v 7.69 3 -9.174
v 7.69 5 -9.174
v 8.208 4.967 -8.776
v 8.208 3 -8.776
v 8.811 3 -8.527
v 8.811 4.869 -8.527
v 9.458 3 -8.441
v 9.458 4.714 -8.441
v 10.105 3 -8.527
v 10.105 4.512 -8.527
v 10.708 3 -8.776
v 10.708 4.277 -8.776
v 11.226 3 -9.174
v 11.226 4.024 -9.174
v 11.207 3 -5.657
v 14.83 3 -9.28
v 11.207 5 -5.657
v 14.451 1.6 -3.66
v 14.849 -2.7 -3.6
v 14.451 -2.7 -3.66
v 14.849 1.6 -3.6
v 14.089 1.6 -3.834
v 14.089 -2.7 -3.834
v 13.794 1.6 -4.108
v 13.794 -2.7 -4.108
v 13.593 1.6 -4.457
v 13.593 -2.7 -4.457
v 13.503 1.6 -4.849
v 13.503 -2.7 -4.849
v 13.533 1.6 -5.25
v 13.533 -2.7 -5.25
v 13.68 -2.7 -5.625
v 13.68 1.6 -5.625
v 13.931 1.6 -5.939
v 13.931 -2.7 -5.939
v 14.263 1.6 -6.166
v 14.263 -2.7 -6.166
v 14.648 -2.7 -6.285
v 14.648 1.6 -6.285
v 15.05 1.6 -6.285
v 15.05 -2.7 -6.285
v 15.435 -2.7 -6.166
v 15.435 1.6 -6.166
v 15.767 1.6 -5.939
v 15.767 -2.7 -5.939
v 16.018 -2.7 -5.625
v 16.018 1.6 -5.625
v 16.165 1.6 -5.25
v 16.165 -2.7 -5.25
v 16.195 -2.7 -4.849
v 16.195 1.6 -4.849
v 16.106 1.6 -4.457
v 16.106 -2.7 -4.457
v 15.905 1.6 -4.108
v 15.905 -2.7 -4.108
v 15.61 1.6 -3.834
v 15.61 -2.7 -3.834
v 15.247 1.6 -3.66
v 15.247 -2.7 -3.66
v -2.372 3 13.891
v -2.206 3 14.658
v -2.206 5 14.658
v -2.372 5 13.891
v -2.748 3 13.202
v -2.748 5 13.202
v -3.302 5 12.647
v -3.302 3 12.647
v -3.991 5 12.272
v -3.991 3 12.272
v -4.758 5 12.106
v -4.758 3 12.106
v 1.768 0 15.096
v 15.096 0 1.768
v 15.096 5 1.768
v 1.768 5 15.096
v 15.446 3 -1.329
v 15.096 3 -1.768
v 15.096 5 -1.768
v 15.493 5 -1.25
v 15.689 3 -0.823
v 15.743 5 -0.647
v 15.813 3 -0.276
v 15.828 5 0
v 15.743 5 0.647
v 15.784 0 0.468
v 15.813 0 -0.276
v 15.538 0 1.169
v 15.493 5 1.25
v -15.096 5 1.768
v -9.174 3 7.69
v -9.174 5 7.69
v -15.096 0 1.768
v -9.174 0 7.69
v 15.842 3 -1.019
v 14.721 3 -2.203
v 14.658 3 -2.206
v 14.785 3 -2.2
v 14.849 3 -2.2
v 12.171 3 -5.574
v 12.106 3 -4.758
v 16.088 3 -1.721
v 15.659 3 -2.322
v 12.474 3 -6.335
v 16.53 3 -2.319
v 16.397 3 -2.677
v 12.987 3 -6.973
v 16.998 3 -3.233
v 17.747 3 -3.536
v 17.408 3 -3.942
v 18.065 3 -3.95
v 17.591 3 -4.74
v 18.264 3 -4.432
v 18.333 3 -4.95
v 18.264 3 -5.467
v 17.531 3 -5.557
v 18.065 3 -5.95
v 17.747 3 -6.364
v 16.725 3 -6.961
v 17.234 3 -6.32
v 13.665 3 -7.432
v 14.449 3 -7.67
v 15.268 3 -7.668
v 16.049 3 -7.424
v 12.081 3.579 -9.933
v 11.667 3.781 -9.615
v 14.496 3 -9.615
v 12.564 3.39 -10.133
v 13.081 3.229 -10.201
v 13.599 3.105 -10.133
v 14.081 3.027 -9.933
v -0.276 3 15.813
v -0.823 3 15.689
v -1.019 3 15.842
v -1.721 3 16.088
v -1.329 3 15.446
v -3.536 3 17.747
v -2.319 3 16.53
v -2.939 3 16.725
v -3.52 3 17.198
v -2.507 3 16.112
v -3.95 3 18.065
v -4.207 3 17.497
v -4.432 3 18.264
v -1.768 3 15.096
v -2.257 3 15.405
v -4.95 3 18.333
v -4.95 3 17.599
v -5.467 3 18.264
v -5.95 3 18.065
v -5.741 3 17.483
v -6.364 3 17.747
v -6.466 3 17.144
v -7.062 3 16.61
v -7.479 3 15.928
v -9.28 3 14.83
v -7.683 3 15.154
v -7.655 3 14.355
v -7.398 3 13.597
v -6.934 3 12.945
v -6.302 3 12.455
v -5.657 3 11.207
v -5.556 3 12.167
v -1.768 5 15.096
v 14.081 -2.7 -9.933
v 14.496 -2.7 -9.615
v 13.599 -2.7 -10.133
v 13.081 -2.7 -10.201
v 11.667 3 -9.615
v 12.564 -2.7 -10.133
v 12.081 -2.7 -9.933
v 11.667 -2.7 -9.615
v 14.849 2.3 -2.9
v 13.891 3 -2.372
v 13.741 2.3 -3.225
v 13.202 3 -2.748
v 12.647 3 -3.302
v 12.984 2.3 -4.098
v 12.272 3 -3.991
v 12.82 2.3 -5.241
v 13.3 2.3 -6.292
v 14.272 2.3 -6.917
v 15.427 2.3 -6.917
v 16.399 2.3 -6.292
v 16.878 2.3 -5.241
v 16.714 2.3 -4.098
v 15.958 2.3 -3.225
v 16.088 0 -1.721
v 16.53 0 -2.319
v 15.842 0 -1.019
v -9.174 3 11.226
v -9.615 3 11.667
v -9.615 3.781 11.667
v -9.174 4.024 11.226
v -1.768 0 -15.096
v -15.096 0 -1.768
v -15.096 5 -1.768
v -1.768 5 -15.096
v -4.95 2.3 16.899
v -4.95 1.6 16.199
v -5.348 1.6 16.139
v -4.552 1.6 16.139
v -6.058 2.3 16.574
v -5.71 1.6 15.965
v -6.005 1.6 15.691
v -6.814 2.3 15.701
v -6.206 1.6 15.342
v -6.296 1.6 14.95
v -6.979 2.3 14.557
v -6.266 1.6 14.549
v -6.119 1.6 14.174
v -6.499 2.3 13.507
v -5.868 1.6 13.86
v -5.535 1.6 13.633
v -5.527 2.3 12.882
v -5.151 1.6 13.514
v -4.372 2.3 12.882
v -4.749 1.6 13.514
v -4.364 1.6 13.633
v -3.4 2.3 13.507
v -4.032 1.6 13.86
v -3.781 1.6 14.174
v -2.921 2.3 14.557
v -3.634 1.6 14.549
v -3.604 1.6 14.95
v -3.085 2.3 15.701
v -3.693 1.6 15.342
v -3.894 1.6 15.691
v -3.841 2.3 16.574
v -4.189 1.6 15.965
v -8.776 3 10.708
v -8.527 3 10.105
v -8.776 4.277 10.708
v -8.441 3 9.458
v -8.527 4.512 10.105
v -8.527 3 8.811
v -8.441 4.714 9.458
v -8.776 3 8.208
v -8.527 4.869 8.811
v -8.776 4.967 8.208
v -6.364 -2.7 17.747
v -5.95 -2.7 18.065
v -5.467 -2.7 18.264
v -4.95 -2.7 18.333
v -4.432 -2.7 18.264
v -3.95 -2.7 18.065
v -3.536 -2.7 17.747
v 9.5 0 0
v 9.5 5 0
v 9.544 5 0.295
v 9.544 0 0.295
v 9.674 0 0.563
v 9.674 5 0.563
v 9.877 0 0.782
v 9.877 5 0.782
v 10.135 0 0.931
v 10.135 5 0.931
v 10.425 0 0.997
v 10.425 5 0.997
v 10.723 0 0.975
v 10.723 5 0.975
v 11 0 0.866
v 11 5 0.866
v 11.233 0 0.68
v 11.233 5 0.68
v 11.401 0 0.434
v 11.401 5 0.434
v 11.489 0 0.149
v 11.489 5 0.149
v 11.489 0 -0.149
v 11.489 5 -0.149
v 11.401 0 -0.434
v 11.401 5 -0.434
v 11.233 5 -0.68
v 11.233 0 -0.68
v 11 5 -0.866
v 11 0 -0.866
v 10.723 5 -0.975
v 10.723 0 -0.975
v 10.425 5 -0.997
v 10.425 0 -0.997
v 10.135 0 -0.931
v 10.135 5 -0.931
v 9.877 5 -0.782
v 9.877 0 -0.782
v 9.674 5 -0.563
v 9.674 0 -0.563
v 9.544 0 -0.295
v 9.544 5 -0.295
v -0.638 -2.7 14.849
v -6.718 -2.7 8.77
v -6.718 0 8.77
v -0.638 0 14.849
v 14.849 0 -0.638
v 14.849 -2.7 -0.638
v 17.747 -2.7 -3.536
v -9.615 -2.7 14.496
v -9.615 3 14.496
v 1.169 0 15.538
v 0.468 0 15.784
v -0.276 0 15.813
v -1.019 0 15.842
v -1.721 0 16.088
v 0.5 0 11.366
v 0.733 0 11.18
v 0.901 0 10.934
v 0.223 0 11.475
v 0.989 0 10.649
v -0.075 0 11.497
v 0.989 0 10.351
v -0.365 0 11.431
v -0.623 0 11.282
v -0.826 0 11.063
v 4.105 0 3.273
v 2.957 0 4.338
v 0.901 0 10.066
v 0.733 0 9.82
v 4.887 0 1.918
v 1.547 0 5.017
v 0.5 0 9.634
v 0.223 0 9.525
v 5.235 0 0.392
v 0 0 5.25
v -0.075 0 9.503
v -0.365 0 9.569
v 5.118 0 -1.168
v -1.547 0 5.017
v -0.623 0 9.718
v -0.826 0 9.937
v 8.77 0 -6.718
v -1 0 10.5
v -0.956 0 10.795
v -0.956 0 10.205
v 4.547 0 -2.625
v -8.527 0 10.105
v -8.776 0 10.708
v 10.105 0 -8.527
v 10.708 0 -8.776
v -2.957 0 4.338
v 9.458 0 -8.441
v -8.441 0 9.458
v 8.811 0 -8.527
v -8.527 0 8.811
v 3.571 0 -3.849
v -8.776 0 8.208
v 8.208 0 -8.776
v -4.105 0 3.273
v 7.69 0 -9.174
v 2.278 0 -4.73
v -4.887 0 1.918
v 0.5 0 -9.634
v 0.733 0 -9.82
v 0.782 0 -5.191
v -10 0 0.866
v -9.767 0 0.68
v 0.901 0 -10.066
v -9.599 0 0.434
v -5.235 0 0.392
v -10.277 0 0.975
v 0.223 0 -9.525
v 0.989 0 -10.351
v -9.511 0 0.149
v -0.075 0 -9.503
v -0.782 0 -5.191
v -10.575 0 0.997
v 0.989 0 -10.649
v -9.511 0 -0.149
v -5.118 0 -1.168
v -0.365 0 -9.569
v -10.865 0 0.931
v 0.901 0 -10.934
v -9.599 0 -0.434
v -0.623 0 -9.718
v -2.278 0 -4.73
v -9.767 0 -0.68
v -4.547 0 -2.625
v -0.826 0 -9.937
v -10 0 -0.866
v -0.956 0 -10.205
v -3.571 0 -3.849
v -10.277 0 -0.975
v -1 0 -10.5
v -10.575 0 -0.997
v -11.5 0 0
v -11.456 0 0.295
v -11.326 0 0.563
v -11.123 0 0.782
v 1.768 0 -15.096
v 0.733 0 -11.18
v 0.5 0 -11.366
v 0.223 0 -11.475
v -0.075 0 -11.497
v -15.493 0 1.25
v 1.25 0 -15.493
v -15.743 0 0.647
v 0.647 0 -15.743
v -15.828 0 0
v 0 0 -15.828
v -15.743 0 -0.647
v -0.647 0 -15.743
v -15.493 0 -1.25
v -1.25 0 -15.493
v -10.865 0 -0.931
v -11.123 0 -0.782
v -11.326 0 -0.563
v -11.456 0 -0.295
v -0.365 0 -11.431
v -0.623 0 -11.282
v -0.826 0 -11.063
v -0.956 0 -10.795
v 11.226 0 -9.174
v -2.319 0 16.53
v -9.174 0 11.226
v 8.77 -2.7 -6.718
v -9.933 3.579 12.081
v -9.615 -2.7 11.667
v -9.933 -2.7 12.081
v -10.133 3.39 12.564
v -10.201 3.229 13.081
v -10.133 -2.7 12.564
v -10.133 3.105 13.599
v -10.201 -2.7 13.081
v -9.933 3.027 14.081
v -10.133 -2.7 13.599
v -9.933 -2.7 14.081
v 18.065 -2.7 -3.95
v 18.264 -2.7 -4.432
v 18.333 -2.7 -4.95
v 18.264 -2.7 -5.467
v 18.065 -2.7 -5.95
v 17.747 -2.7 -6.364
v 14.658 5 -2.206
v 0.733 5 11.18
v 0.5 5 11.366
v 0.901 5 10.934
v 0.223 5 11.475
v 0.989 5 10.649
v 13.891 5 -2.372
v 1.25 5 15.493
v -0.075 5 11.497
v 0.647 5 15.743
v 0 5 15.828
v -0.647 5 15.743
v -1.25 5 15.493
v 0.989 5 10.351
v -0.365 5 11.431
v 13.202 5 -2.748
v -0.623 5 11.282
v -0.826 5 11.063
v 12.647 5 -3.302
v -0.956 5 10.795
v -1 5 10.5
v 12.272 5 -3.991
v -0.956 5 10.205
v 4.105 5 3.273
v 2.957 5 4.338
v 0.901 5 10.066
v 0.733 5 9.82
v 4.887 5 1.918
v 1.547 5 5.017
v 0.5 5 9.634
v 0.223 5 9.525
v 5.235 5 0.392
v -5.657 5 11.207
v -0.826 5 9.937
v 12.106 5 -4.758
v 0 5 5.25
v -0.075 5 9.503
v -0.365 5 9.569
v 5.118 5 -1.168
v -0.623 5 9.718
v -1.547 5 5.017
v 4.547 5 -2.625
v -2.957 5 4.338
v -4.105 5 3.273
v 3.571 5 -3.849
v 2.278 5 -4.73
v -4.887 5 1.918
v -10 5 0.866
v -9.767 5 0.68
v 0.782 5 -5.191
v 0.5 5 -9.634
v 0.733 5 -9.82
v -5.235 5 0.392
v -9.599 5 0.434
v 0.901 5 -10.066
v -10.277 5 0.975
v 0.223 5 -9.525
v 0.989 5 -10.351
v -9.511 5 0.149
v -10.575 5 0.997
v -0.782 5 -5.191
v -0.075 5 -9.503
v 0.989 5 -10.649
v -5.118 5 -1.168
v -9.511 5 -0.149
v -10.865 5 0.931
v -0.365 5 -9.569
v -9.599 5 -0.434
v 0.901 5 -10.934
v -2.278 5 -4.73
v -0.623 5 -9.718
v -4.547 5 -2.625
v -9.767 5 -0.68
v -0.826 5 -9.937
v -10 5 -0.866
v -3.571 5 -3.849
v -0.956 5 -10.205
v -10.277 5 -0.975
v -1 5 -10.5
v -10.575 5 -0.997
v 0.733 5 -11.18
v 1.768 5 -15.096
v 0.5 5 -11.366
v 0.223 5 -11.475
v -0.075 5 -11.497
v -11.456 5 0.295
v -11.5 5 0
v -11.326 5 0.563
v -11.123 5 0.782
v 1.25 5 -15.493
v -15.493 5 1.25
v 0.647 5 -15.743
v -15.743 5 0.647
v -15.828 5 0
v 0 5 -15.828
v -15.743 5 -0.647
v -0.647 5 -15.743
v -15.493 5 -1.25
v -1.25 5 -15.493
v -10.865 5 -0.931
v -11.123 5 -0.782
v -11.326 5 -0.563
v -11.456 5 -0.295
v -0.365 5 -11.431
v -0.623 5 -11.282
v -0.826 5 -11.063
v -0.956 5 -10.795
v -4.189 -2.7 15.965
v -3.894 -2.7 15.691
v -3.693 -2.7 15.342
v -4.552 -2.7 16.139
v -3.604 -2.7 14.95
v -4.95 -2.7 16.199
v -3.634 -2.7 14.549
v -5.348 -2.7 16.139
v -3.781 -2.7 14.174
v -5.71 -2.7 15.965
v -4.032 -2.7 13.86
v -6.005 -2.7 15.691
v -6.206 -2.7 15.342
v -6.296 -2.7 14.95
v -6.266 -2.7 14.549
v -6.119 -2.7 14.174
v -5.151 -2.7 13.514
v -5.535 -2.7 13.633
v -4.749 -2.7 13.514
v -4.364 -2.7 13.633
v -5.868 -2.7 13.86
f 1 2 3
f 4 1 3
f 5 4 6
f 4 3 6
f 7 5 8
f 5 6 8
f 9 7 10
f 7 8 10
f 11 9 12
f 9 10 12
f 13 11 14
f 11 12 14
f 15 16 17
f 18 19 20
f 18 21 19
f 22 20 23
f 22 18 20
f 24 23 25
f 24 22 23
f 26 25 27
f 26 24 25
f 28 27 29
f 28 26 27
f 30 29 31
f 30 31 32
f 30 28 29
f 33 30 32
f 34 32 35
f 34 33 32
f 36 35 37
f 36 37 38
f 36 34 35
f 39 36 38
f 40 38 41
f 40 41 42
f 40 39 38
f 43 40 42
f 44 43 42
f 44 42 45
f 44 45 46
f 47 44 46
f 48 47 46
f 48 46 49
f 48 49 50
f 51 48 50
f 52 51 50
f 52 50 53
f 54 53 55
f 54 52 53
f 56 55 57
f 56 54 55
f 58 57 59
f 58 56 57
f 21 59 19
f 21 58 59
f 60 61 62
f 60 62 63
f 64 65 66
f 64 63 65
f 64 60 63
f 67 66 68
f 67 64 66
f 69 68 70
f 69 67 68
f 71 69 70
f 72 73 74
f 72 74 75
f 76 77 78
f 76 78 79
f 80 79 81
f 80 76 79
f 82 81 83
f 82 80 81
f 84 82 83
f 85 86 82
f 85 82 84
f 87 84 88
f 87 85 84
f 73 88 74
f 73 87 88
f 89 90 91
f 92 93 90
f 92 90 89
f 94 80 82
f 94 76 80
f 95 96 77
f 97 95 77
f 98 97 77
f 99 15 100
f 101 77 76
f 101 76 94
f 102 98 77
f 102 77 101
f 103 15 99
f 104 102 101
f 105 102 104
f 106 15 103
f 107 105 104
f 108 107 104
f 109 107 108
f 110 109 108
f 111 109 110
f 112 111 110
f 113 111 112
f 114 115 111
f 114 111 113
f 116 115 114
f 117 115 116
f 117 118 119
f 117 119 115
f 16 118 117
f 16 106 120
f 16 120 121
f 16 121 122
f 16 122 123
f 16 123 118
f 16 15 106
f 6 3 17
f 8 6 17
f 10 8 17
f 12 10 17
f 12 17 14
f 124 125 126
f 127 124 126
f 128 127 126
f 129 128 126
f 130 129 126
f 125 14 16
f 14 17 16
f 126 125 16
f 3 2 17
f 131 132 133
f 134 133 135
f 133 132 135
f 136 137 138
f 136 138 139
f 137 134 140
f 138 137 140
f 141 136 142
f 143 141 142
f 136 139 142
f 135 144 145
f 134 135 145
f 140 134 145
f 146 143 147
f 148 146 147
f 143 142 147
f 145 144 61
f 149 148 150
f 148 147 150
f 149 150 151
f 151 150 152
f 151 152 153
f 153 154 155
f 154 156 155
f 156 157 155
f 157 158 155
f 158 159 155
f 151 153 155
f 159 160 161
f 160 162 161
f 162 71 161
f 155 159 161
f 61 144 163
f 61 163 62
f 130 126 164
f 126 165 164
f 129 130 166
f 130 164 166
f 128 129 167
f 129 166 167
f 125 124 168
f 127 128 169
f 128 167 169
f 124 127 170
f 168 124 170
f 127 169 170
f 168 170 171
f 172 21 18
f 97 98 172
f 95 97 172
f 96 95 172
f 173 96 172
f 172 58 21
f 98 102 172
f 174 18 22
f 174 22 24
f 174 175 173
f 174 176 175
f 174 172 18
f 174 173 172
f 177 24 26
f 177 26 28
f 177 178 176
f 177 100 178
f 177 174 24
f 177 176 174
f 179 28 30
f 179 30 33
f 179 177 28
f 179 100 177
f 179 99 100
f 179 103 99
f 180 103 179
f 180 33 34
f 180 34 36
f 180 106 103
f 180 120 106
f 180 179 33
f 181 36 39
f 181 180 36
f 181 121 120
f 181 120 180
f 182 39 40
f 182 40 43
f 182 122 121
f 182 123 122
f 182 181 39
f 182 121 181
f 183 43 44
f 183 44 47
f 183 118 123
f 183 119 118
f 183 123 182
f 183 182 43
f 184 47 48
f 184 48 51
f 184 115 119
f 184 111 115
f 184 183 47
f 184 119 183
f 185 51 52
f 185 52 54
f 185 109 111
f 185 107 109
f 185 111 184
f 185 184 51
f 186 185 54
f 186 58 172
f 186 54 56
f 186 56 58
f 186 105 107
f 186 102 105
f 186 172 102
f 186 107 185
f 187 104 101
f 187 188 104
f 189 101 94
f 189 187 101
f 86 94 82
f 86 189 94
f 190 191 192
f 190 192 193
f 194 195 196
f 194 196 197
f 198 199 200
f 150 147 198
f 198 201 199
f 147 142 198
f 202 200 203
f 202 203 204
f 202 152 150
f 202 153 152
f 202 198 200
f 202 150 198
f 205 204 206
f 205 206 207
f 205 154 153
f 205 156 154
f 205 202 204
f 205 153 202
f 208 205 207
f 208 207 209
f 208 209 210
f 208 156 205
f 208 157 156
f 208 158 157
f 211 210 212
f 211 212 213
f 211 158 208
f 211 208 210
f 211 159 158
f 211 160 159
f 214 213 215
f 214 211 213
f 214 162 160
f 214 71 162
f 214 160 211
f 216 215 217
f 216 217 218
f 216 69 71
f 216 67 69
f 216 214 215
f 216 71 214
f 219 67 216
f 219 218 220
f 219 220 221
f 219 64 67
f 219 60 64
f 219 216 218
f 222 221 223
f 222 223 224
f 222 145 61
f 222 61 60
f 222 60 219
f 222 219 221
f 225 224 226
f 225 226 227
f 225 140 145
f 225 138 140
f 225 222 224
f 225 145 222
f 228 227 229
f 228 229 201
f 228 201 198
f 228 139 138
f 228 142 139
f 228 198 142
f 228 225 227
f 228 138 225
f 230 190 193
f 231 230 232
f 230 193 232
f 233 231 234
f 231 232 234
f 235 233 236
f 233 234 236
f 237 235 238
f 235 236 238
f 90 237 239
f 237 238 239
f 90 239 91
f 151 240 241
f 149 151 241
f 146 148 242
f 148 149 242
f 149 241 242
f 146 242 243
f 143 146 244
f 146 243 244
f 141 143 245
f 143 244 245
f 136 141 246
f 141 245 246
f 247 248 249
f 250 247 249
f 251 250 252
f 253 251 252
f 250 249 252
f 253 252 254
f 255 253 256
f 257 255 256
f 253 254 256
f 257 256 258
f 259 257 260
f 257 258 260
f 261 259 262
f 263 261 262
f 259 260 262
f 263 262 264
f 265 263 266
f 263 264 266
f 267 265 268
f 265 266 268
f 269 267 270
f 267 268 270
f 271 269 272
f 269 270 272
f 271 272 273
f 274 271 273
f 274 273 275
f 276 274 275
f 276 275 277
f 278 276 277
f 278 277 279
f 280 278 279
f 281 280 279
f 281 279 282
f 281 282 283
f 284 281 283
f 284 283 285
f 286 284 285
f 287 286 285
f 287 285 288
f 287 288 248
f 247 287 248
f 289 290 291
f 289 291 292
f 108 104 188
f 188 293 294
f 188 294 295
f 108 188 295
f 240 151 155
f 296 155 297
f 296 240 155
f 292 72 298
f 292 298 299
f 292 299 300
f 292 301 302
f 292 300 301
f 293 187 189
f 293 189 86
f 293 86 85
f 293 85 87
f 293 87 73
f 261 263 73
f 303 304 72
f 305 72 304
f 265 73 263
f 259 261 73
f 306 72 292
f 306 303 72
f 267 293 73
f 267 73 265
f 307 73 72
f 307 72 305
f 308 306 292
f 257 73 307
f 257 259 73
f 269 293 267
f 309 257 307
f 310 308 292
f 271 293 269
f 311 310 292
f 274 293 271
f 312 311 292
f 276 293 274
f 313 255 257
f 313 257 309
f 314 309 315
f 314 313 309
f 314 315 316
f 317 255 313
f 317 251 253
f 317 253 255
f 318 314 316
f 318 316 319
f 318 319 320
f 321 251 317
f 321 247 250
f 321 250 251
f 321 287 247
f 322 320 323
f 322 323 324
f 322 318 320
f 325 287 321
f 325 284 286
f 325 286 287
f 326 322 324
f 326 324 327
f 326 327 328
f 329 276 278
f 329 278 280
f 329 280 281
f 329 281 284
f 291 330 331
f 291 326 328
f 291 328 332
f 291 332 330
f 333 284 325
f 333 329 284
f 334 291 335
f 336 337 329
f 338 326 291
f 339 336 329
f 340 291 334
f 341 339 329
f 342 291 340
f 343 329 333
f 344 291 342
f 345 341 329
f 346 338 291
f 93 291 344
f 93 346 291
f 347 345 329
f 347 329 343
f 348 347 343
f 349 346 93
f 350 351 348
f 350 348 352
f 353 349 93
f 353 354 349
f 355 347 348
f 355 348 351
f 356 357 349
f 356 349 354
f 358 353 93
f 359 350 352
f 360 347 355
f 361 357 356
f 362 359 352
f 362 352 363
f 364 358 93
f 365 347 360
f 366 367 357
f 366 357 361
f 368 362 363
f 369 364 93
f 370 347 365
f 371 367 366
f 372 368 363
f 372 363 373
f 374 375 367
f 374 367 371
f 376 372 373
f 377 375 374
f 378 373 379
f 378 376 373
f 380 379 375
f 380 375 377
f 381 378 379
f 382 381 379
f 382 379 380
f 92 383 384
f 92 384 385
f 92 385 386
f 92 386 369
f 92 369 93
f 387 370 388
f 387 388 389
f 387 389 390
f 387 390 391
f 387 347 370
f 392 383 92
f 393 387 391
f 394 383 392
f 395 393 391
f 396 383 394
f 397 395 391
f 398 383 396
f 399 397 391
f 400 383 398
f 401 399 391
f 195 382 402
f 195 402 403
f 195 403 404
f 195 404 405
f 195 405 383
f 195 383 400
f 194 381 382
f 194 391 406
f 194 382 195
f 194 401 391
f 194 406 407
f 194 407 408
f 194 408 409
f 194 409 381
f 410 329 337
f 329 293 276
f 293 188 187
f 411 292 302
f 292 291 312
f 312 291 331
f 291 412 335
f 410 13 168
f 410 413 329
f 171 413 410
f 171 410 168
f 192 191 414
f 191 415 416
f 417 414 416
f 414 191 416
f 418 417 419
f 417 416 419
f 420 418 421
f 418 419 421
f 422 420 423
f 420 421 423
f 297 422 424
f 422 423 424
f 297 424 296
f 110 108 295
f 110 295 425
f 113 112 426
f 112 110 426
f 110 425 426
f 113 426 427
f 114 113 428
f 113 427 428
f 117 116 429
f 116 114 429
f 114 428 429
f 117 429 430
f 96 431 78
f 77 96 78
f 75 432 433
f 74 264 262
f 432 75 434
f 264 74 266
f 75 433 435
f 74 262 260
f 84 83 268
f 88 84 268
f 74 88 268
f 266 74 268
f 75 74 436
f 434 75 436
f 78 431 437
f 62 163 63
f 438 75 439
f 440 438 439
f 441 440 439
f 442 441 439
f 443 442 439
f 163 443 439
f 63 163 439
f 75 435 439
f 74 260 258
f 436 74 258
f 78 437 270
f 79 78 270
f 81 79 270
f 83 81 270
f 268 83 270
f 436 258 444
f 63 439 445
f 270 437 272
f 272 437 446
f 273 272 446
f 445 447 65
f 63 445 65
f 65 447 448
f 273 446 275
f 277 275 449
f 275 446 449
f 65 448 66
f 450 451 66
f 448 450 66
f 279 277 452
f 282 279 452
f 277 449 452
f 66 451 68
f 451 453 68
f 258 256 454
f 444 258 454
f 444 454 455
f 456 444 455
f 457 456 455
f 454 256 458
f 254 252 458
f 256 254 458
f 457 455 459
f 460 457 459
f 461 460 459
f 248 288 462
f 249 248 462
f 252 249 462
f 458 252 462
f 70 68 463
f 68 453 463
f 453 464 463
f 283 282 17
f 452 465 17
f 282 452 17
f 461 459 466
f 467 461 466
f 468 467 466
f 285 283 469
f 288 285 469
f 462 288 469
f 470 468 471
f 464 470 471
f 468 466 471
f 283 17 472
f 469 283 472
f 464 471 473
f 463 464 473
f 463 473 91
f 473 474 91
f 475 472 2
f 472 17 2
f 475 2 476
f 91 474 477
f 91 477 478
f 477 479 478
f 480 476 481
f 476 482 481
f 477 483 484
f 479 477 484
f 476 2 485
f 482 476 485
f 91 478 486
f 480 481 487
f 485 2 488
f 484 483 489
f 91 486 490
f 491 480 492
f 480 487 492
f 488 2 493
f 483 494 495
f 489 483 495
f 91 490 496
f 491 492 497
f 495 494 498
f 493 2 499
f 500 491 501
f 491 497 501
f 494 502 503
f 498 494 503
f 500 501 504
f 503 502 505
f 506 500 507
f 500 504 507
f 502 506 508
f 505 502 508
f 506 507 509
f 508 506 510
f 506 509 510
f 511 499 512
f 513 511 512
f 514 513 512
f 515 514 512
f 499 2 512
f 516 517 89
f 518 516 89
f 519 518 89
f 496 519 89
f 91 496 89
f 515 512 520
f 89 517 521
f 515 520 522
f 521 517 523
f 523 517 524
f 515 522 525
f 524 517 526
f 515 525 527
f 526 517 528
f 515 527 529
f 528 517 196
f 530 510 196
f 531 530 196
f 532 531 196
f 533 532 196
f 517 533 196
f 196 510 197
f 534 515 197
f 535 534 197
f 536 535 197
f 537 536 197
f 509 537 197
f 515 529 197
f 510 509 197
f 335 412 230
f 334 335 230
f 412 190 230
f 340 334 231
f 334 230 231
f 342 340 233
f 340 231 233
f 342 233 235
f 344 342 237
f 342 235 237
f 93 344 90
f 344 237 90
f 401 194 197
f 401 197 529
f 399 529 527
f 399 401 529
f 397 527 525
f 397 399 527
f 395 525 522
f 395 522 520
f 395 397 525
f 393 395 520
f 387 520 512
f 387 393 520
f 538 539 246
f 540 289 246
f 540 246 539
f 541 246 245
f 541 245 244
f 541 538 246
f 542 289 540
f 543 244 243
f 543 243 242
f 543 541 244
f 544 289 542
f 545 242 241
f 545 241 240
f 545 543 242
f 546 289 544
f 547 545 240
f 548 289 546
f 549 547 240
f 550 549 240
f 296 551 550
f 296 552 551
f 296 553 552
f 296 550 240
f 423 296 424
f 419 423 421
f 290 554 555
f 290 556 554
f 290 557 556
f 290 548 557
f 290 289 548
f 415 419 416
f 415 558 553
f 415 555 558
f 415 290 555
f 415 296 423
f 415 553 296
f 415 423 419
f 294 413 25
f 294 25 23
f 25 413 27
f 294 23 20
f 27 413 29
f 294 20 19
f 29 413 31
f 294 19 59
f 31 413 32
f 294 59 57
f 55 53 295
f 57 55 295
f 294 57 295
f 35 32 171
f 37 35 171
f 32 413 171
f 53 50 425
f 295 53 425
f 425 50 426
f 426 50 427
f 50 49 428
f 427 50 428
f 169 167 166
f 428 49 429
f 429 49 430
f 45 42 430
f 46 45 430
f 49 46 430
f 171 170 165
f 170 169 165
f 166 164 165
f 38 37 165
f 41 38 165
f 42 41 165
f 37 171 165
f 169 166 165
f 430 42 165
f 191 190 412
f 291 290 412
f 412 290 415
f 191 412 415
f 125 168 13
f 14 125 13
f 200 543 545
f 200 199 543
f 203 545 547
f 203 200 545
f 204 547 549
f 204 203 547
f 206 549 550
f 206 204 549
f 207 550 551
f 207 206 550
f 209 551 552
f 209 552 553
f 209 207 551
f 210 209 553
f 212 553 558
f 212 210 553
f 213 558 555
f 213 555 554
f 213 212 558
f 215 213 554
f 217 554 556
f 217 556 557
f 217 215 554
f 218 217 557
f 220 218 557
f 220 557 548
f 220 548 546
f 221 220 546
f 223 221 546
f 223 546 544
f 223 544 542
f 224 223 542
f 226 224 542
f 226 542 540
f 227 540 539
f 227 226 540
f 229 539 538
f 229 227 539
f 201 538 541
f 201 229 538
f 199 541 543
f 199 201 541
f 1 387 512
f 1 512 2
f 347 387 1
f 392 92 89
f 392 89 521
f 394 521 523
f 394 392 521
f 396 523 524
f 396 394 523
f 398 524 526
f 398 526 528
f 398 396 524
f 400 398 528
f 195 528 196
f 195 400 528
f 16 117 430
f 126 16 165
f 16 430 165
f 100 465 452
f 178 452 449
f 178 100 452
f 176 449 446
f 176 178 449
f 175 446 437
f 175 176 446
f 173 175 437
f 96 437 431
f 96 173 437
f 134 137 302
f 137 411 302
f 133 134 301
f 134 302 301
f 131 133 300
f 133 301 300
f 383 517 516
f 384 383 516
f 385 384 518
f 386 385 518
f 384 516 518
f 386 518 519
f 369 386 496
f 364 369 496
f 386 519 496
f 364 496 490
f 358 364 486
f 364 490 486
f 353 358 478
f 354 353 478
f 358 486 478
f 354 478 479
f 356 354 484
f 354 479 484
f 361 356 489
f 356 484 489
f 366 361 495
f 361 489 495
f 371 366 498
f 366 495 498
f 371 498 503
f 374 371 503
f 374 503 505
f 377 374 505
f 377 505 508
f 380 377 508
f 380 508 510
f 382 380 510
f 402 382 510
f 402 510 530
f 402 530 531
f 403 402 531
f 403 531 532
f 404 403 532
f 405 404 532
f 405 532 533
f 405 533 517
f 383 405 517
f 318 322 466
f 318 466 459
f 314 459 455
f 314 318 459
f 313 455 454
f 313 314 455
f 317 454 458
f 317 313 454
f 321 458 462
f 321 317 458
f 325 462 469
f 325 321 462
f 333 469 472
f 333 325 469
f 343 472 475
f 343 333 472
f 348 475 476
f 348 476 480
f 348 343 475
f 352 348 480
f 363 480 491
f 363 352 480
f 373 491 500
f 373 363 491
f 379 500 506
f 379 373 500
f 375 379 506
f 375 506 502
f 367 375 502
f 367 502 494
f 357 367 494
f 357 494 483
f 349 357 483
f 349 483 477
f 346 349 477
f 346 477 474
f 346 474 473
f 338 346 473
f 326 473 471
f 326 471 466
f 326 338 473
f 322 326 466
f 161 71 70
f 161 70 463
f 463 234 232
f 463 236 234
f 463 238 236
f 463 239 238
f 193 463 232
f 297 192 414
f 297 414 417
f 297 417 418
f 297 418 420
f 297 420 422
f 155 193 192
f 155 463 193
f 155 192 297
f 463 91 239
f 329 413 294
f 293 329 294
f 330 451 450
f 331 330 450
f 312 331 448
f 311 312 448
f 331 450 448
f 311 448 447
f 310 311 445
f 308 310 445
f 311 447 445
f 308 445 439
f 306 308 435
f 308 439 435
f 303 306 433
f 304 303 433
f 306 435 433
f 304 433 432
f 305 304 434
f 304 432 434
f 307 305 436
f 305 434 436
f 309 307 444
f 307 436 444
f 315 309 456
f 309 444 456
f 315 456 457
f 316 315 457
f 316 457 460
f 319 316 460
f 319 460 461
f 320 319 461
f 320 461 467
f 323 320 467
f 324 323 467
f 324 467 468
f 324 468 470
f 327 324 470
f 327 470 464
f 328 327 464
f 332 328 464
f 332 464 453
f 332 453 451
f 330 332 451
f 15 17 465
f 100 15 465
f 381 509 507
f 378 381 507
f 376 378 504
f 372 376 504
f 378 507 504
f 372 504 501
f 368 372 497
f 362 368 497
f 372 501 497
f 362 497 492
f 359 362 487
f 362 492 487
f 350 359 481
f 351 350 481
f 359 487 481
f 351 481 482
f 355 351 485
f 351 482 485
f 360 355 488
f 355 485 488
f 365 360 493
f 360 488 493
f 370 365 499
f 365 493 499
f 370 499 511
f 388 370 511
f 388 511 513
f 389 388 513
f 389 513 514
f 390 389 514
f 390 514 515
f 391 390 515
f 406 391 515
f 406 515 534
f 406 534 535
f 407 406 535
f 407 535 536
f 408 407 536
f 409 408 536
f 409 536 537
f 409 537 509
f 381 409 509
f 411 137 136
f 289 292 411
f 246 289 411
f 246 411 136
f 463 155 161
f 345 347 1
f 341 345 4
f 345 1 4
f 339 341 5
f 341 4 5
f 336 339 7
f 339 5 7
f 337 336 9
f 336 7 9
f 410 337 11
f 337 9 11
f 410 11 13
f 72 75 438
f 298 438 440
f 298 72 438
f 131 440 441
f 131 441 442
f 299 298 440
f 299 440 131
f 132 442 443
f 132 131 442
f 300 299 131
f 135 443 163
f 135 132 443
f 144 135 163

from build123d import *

# Parameters (mm, degrees)
SKETCH1_R                                      = 0.5
SKETCH1_R_2                                    = 5.25
BOSS_EXTRUDE1_DEPTH                            = 5
SKETCH3_R                                      = 1.3
BOSS_EXTRUDE4_DEPTH                            = 5.7
BOSS_EXTRUDE6_DEPTH                            = 2.473491095
FILLET1_R                                      = 2.5
FILLET2_R                                      = 2
F_2_0MM_DOWEL_HOLE1_D                          = 2
F_2_0MM_DOWEL_HOLE1_DEPTH                      = 42.93
F_2_0MM_DOWEL_HOLE1_TIP                        = 0.600860619
CSK_FOR_M2_5_FLAT_HEAD_MACHINE_SCREW1_AT_COUNT = 2
CSK_FOR_M2_5_FLAT_HEAD_MACHINE_SCREW1_AT_PITCH = 28
SKETCH14_R                                     = 2.75
CUT_EXTRUDE1_DEPTH                             = 27.54536008


with BuildPart() as part:
    # Sketch1 → Boss-Extrude1 (new body)
    with BuildSketch(Plane(origin=(0, 0, 0), x_dir=(1, 0, 0), z_dir=(0, 1, 0))):
        with BuildLine():
            Line((1.767766953, 15.096194078), (15.096194078, 1.767766953))
            ThreePointArc((15.096194078, 1.767766953), (15.828427125, 0), (15.096194078, -1.767766953))
            Line((15.096194078, -1.767766953), (1.767766953, -15.096194078))
            ThreePointArc((1.767766953, -15.096194078), (0, -15.828427125), (-1.767766953, -15.096194078))
            Line((-1.767766953, -15.096194078), (-15.096194078, -1.767766953))
            ThreePointArc((-15.096194078, -1.767766953), (-15.828427125, 0), (-15.096194078, 1.767766953))
            Line((-15.096194078, 1.767766953), (-1.767766953, 15.096194078))
            ThreePointArc((-1.767766953, 15.096194078), (0, 15.828427125), (1.767766953, 15.096194078))
        make_face()
        with Locations(Location((0, 10.5, 0), (0, 0, 270))):
            Circle(SKETCH1_R, mode=Mode.SUBTRACT)
        with Locations(Location((0, -10.5, 0), (0, 0, 270))):
            Circle(SKETCH1_R, mode=Mode.SUBTRACT)
        with Locations(Location((10.5, 0, 0), (0, 0, 270))):
            Circle(SKETCH1_R, mode=Mode.SUBTRACT)
        with Locations(Location((-10.5, 0, 0), (0, 0, 270))):
            Circle(SKETCH1_R, mode=Mode.SUBTRACT)
        with Locations(Location((0, 0, 0), (0, 0, 270))):
            Circle(SKETCH1_R_2, mode=Mode.SUBTRACT)
    extrude(amount=BOSS_EXTRUDE1_DEPTH)

    # Sketch3 → Boss-Extrude4 (add)
    # profile 1 of 4: a face of its own
    with BuildSketch(Plane(origin=(0, -2.7, 0), x_dir=(1, 0, 0), z_dir=(0, 1, 0))):
        Polygon((-4.949747468, -10.537489101), (-0.637994164, -14.849242405), (-4.949747468, -19.160995709), (-9.261500772, -14.849242405), align=None)
        with Locations(Location((-4.949747468, -14.849242405, 0), (0, 0, 90))):
            Circle(SKETCH3_R, mode=Mode.SUBTRACT)
    # profile 2 of 4: a face of its own
    with BuildSketch(Plane(origin=(0, -2.7, 0), x_dir=(1, 0, 0), z_dir=(0, 1, 0))):
        Polygon((-6.717514421, -8.769722148), (-11.029267725, -13.081475452), (-9.261500772, -14.849242405), (-4.949747468, -10.537489101), align=None)
    # profile 3 of 4: a face of its own
    with BuildSketch(Plane(origin=(0, -2.7, 0), x_dir=(1, 0, 0), z_dir=(0, 1, 0))):
        Polygon((19.160995709, 4.949747468), (14.849242405, 9.261500772), (10.537489101, 4.949747468), (14.849242405, 0.637994164), align=None)
        with Locations(Location((14.849242405, 4.949747468, 0), (0, 0, 90))):
            Circle(SKETCH3_R, mode=Mode.SUBTRACT)
    # profile 4 of 4: a face of its own
    with BuildSketch(Plane(origin=(0, -2.7, 0), x_dir=(1, 0, 0), z_dir=(0, 1, 0))):
        Polygon((13.081475452, 11.029267725), (14.849242405, 9.261500772), (10.537489101, 4.949747468), (8.769722148, 6.717514421), align=None)
    extrude(amount=BOSS_EXTRUDE4_DEPTH)


with BuildPart() as boss_extrude6_tool:
    # Sketch7 → Boss-Extrude6 (new body)
    with BuildSketch(Plane(origin=(2.775126076, -2.11e-07, 2.775126076), x_dir=(0.7071067811865474, 0, -0.7071067811865478), z_dir=(0.7071067811865468, -5.372690076738491e-08, 0.7071067811865464))):
        Polygon((11.924621202, 5.000000506), (17.04887, 3.00000054), (11.924621202, 3.000000506), align=None)
        Polygon((-11.924621202, 5.000000506), (-17.04887, 3.00000054), (-11.924621202, 3.000000506), align=None)
    extrude(amount=-BOSS_EXTRUDE6_DEPTH)


with BuildPart() as part_1:
    add(part.part)


with BuildPart() as part_2:
    # Boss-Extrude6: joined with boss_extrude6_tool
    add(part_1.part.fuse(boss_extrude6_tool.part, tol=0.00001))

    # Fillet1
    fillet1_edges = [part_2.edges().sort_by_distance(p)[0] for p in [
        (-7.405876652, 1.5, 9.458084379),
        (-1.270359497, 1.5, 15.481607737),
        (9.458084379, 1.5, -7.405876652),
        (15.481607737, 1.5, -1.270359497),
    ]]
    fillet(fillet1_edges, radius=FILLET1_R)

    # Fillet2
    # the kernel refuses this fillet: 2 mm, written as the material it takes off along each edge
    with BuildSketch(Plane(origin=(-4.949747468, -7.7, 19.160995709), x_dir=(0.7071067811865477, 0, -0.7071067811865475), z_dir=(0, 1, 0)), Plane(origin=(13.081475452, -7.7, -11.029267725), x_dir=(-0.7071067811865471, 0, 0.707106781186548), z_dir=(0, 1, 0)), Plane(origin=(19.160995709, -7.7, -4.949747468), x_dir=(-0.7071067811865482, 0, -0.7071067811865469), z_dir=(0, 1, 0))) as fillet2_piece_1:
        with BuildLine():
            CenterArc((FILLET2_R, FILLET2_R), FILLET2_R, 180, 90)
            Line((0, FILLET2_R), (0, 0))
            Line((0, 0), (FILLET2_R, 0))
        make_face()
    extrude(amount=15.7, mode=Mode.SUBTRACT)
    with BuildSketch(Plane(origin=(-11.029267725, -7.7, 13.081475452), x_dir=(0.7071067811865476, 0, -0.7071067811865476), z_dir=(0, 1, 0))) as fillet2_piece_2:
        with BuildLine():
            CenterArc((FILLET2_R, -FILLET2_R), FILLET2_R, 90, 90)
            Line((0, -FILLET2_R), (0, 0))
            Line((0, 0), (FILLET2_R, 0))
        make_face()
    extrude(amount=15.7, mode=Mode.SUBTRACT)

    # Ø2.0mm Dowel Hole1
    with Locations(Plane.XZ):
        with Locations((0, 10.5), (10.5, 0), (-10.5, 0), (0, -10.5)):
            Hole(F_2_0MM_DOWEL_HOLE1_D / 2, depth=F_2_0MM_DOWEL_HOLE1_DEPTH)
            with Locations((0, 0, -(F_2_0MM_DOWEL_HOLE1_DEPTH + F_2_0MM_DOWEL_HOLE1_TIP / 2))):  # 118° drill point
                Cone(0, F_2_0MM_DOWEL_HOLE1_D / 2, F_2_0MM_DOWEL_HOLE1_TIP, mode=Mode.SUBTRACT)

    # Sketch12 → CSK for M2.5 Flat Head Machine Screw1 (revolve, cut)
    with BuildSketch(Plane(origin=(-4.949747468, 3, 14.849242405), x_dir=(0, 0, 1), z_dir=(1, 0, 0))):
        Polygon((0, 0), (0, 5.7), (1.35, 5.7), (1.35, 1.4), (2.75, 0), align=None)
    csk_for_m2_5_flat_head_machine_screw1 = revolve(axis=Axis((-4.949747468, 9.35, 14.849242405), (0, -1, 0)), mode=Mode.SUBTRACT)

    # CSK for M2.5 Flat Head Machine Screw1 at: CSK for M2.5 Flat Head Machine Screw1 ×2
    with Locations(*[Vector(0.7071067811865477, 0, -0.7071067811865475) * (i * CSK_FOR_M2_5_FLAT_HEAD_MACHINE_SCREW1_AT_PITCH) for i in range(1, CSK_FOR_M2_5_FLAT_HEAD_MACHINE_SCREW1_AT_COUNT)]):
        add(csk_for_m2_5_flat_head_machine_screw1, mode=Mode.SUBTRACT)

    # Sketch14 → Cut-Extrude1 (cut, through all)
    with BuildSketch(Plane(origin=(0, 3, 0), x_dir=(1, 0, 0), z_dir=(0, 1, 0))):
        with Locations((-4.949747468, -14.849242405)):
            Circle(SKETCH14_R)
        with Locations((14.849242405, 4.949747468)):
            Circle(SKETCH14_R)
    extrude(amount=CUT_EXTRUDE1_DEPTH, mode=Mode.SUBTRACT)


solid = part_2.part
